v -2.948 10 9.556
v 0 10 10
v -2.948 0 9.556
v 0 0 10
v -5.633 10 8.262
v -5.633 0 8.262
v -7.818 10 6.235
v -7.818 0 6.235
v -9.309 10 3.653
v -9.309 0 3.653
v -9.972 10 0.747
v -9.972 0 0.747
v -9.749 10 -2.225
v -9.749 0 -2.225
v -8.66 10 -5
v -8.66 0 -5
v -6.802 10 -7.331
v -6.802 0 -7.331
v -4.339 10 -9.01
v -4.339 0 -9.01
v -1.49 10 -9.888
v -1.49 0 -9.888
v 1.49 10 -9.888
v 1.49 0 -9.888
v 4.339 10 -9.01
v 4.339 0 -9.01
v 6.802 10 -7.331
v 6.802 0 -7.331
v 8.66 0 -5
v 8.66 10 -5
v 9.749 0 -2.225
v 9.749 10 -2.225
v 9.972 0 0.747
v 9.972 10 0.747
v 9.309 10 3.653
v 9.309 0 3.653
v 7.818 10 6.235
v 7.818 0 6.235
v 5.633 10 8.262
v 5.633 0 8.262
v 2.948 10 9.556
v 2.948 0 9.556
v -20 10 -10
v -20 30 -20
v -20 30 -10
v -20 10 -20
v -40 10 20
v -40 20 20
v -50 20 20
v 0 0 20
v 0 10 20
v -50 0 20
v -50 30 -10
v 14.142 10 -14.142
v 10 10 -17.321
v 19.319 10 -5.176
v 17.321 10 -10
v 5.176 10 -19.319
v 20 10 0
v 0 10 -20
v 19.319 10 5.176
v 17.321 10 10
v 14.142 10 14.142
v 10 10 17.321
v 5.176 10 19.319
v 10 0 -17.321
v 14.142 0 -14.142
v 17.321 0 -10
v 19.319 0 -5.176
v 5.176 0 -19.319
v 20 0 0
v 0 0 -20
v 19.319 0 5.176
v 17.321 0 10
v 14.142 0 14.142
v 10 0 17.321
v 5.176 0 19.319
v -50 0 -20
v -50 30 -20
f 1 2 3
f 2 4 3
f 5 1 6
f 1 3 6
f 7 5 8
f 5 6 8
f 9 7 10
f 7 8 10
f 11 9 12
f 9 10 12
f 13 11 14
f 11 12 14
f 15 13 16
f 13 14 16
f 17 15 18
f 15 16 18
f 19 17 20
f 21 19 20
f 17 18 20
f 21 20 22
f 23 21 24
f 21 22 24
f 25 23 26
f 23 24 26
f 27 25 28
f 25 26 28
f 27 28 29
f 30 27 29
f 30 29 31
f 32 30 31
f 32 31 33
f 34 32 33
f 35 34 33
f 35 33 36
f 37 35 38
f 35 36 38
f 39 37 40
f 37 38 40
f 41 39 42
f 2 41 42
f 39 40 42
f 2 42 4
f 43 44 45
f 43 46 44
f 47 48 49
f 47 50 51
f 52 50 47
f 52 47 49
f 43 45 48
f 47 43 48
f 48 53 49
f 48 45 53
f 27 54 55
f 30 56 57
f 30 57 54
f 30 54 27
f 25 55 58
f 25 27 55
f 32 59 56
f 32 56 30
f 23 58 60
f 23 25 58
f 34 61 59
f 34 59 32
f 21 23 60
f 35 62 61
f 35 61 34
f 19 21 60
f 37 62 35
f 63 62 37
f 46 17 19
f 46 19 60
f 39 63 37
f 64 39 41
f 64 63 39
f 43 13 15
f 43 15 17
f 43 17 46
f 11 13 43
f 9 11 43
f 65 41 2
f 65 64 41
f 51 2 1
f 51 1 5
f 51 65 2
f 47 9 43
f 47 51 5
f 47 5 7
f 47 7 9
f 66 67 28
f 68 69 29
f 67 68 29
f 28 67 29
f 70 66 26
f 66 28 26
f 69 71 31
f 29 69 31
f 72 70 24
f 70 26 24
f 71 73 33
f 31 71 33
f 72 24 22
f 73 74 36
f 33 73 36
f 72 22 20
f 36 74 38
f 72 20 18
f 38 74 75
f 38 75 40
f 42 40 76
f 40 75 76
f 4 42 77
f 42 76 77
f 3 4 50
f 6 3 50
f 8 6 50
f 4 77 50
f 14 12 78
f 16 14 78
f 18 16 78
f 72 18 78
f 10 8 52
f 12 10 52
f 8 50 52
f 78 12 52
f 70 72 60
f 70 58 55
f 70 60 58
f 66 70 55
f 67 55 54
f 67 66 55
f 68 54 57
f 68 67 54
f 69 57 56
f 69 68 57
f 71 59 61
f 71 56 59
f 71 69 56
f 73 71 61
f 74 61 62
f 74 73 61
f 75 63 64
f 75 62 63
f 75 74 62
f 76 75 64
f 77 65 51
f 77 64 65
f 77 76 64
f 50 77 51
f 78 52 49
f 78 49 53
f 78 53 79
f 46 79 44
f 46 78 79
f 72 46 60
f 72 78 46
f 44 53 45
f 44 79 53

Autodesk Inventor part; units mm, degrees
ref_plane "YZ Plane" through (0, 0, 0) normal (1, 0, 0) x (0, 1, 0)
ref_plane "XZ Plane" through (0, 0, 0) normal (0, 1, 0) x (-1, 0, 0)
ref_plane "XY Plane" through (0, 0, 0) normal (0, 0, 1) x (1, 0, 0)
sketch "草圖1" plane through (0, 0, 0) normal (0, 1, 0) x (-1, 0, 0)
  circle A0 centre (0, 0) radius 20
  line L0 (0, -20) -> (50, -20)
  line L1 (50, -20) -> (50, 20)
  line L2 (50, 20) -> (0, 20)
  line L3 (0, 20) -> (0, -20)
  point P0 (0, 20)
  dimension "d0" = 40
  dimension "d1" = 50
extrude "擠出1" add sketch "草圖1" along normal blind 10
sketch "草圖2" plane through (0, 10, 0) normal (0, 1, 0) x (1, 0, 0)
  line L0 (-50, -20) -> (-50, 20) projected
  line L1 (-50, 20) -> (0, 20) projected
  arc A0 (0, -20) -> (0, 20) centre (0, 0) ccw projected
  line L2 (0, -20) -> (-50, -20) projected
  line L3 (-50, -20) -> (-50, 20) projected
  line L4 (-50, 20) -> (0, 20) projected
  arc A1 (0, -20) -> (0, 20) centre (0, 0) ccw projected
  line L5 (0, -20) -> (-50, -20) projected
  line L6 (0, 20) -> (-50, 20) projected
  line L7 (-50, 20) -> (-20, 20)
  line L8 (-20, 20) -> (-20, -20)
  line L9 (-20, -20) -> (-50, -20)
  line L10 (-50, -20) -> (-50, 20)
  line L11 (-50, -20) -> (0, -20) projected
  point P0 (-20, -20)
  point P1 (-20, 20)
  dimension "d4" = 30
extrude "擠出2" add sketch "草圖2" along normal blind 20 contours L0 L1 L8 L2
sketch "草圖3" plane through (0, 30, 0) normal (0, 1, 0) x (1, 0, 0)
  line L0 (-50, -20) -> (-50, 20) projected
  line L1 (-50, 20) -> (-20, 20) projected
  line L2 (-20, 20) -> (-20, -20) projected
  line L3 (-20, -20) -> (-50, -20) projected
  line L4 (-20, 10) -> (-40, -20)
  point P0 (0, 0)
  dimension "d7" = 10
  dimension "d8" = 10
extrude "擠出3" cut sketch "草圖3" against normal up to surface (20 mm away) contours L4 L2 L3
sketch "草圖6" plane through (-20, 10, -20) normal (1, 0, 0) x (0, 0, -1)
  line L0 (-10, 0) -> (-10, 20) projected
  line L1 (-10, 20) -> (0, 20) projected
  line L2 (0, 20) -> (0, 0) projected
  line L3 (-10, 0) -> (0, 0) projected
  line L4 (-40, 0) -> (-10, 0) projected
  line L5 (-40, -10) -> (-40, 0) projected
  line L6 (0, -10) -> (-40, -10) projected
  line L7 (0, 0) -> (0, -10) projected
  line L8 (-10, 20) -> (-10, 0) projected
  line L9 (-10, 20) -> (-40, 10)
  line L10 (-40, 10) -> (-10, 10)
  line L11 (-10, 10) -> (-10, 20)
  line L12 (-40, 0) -> (-40, 20) projected
  line L13 (-40, 20) -> (-10, 20) projected
  point P0 (-20, -10)
  dimension "d14" = 10
extrude "擠出4" cut sketch "草圖6" against normal blind 85.25 contours L9 L12 L13
sketch "草圖7" plane through (0, 10, 0) normal (0, 1, 0) x (1, 0, 0)
  arc A0 (0, -20) -> (0, 20) centre (0, 0) ccw projected
hole "孔1" at (0, 10, 0) direction (0, -1, 0) diameter 20 end through all
properties part number "27" material "鋼、碳鋼"
